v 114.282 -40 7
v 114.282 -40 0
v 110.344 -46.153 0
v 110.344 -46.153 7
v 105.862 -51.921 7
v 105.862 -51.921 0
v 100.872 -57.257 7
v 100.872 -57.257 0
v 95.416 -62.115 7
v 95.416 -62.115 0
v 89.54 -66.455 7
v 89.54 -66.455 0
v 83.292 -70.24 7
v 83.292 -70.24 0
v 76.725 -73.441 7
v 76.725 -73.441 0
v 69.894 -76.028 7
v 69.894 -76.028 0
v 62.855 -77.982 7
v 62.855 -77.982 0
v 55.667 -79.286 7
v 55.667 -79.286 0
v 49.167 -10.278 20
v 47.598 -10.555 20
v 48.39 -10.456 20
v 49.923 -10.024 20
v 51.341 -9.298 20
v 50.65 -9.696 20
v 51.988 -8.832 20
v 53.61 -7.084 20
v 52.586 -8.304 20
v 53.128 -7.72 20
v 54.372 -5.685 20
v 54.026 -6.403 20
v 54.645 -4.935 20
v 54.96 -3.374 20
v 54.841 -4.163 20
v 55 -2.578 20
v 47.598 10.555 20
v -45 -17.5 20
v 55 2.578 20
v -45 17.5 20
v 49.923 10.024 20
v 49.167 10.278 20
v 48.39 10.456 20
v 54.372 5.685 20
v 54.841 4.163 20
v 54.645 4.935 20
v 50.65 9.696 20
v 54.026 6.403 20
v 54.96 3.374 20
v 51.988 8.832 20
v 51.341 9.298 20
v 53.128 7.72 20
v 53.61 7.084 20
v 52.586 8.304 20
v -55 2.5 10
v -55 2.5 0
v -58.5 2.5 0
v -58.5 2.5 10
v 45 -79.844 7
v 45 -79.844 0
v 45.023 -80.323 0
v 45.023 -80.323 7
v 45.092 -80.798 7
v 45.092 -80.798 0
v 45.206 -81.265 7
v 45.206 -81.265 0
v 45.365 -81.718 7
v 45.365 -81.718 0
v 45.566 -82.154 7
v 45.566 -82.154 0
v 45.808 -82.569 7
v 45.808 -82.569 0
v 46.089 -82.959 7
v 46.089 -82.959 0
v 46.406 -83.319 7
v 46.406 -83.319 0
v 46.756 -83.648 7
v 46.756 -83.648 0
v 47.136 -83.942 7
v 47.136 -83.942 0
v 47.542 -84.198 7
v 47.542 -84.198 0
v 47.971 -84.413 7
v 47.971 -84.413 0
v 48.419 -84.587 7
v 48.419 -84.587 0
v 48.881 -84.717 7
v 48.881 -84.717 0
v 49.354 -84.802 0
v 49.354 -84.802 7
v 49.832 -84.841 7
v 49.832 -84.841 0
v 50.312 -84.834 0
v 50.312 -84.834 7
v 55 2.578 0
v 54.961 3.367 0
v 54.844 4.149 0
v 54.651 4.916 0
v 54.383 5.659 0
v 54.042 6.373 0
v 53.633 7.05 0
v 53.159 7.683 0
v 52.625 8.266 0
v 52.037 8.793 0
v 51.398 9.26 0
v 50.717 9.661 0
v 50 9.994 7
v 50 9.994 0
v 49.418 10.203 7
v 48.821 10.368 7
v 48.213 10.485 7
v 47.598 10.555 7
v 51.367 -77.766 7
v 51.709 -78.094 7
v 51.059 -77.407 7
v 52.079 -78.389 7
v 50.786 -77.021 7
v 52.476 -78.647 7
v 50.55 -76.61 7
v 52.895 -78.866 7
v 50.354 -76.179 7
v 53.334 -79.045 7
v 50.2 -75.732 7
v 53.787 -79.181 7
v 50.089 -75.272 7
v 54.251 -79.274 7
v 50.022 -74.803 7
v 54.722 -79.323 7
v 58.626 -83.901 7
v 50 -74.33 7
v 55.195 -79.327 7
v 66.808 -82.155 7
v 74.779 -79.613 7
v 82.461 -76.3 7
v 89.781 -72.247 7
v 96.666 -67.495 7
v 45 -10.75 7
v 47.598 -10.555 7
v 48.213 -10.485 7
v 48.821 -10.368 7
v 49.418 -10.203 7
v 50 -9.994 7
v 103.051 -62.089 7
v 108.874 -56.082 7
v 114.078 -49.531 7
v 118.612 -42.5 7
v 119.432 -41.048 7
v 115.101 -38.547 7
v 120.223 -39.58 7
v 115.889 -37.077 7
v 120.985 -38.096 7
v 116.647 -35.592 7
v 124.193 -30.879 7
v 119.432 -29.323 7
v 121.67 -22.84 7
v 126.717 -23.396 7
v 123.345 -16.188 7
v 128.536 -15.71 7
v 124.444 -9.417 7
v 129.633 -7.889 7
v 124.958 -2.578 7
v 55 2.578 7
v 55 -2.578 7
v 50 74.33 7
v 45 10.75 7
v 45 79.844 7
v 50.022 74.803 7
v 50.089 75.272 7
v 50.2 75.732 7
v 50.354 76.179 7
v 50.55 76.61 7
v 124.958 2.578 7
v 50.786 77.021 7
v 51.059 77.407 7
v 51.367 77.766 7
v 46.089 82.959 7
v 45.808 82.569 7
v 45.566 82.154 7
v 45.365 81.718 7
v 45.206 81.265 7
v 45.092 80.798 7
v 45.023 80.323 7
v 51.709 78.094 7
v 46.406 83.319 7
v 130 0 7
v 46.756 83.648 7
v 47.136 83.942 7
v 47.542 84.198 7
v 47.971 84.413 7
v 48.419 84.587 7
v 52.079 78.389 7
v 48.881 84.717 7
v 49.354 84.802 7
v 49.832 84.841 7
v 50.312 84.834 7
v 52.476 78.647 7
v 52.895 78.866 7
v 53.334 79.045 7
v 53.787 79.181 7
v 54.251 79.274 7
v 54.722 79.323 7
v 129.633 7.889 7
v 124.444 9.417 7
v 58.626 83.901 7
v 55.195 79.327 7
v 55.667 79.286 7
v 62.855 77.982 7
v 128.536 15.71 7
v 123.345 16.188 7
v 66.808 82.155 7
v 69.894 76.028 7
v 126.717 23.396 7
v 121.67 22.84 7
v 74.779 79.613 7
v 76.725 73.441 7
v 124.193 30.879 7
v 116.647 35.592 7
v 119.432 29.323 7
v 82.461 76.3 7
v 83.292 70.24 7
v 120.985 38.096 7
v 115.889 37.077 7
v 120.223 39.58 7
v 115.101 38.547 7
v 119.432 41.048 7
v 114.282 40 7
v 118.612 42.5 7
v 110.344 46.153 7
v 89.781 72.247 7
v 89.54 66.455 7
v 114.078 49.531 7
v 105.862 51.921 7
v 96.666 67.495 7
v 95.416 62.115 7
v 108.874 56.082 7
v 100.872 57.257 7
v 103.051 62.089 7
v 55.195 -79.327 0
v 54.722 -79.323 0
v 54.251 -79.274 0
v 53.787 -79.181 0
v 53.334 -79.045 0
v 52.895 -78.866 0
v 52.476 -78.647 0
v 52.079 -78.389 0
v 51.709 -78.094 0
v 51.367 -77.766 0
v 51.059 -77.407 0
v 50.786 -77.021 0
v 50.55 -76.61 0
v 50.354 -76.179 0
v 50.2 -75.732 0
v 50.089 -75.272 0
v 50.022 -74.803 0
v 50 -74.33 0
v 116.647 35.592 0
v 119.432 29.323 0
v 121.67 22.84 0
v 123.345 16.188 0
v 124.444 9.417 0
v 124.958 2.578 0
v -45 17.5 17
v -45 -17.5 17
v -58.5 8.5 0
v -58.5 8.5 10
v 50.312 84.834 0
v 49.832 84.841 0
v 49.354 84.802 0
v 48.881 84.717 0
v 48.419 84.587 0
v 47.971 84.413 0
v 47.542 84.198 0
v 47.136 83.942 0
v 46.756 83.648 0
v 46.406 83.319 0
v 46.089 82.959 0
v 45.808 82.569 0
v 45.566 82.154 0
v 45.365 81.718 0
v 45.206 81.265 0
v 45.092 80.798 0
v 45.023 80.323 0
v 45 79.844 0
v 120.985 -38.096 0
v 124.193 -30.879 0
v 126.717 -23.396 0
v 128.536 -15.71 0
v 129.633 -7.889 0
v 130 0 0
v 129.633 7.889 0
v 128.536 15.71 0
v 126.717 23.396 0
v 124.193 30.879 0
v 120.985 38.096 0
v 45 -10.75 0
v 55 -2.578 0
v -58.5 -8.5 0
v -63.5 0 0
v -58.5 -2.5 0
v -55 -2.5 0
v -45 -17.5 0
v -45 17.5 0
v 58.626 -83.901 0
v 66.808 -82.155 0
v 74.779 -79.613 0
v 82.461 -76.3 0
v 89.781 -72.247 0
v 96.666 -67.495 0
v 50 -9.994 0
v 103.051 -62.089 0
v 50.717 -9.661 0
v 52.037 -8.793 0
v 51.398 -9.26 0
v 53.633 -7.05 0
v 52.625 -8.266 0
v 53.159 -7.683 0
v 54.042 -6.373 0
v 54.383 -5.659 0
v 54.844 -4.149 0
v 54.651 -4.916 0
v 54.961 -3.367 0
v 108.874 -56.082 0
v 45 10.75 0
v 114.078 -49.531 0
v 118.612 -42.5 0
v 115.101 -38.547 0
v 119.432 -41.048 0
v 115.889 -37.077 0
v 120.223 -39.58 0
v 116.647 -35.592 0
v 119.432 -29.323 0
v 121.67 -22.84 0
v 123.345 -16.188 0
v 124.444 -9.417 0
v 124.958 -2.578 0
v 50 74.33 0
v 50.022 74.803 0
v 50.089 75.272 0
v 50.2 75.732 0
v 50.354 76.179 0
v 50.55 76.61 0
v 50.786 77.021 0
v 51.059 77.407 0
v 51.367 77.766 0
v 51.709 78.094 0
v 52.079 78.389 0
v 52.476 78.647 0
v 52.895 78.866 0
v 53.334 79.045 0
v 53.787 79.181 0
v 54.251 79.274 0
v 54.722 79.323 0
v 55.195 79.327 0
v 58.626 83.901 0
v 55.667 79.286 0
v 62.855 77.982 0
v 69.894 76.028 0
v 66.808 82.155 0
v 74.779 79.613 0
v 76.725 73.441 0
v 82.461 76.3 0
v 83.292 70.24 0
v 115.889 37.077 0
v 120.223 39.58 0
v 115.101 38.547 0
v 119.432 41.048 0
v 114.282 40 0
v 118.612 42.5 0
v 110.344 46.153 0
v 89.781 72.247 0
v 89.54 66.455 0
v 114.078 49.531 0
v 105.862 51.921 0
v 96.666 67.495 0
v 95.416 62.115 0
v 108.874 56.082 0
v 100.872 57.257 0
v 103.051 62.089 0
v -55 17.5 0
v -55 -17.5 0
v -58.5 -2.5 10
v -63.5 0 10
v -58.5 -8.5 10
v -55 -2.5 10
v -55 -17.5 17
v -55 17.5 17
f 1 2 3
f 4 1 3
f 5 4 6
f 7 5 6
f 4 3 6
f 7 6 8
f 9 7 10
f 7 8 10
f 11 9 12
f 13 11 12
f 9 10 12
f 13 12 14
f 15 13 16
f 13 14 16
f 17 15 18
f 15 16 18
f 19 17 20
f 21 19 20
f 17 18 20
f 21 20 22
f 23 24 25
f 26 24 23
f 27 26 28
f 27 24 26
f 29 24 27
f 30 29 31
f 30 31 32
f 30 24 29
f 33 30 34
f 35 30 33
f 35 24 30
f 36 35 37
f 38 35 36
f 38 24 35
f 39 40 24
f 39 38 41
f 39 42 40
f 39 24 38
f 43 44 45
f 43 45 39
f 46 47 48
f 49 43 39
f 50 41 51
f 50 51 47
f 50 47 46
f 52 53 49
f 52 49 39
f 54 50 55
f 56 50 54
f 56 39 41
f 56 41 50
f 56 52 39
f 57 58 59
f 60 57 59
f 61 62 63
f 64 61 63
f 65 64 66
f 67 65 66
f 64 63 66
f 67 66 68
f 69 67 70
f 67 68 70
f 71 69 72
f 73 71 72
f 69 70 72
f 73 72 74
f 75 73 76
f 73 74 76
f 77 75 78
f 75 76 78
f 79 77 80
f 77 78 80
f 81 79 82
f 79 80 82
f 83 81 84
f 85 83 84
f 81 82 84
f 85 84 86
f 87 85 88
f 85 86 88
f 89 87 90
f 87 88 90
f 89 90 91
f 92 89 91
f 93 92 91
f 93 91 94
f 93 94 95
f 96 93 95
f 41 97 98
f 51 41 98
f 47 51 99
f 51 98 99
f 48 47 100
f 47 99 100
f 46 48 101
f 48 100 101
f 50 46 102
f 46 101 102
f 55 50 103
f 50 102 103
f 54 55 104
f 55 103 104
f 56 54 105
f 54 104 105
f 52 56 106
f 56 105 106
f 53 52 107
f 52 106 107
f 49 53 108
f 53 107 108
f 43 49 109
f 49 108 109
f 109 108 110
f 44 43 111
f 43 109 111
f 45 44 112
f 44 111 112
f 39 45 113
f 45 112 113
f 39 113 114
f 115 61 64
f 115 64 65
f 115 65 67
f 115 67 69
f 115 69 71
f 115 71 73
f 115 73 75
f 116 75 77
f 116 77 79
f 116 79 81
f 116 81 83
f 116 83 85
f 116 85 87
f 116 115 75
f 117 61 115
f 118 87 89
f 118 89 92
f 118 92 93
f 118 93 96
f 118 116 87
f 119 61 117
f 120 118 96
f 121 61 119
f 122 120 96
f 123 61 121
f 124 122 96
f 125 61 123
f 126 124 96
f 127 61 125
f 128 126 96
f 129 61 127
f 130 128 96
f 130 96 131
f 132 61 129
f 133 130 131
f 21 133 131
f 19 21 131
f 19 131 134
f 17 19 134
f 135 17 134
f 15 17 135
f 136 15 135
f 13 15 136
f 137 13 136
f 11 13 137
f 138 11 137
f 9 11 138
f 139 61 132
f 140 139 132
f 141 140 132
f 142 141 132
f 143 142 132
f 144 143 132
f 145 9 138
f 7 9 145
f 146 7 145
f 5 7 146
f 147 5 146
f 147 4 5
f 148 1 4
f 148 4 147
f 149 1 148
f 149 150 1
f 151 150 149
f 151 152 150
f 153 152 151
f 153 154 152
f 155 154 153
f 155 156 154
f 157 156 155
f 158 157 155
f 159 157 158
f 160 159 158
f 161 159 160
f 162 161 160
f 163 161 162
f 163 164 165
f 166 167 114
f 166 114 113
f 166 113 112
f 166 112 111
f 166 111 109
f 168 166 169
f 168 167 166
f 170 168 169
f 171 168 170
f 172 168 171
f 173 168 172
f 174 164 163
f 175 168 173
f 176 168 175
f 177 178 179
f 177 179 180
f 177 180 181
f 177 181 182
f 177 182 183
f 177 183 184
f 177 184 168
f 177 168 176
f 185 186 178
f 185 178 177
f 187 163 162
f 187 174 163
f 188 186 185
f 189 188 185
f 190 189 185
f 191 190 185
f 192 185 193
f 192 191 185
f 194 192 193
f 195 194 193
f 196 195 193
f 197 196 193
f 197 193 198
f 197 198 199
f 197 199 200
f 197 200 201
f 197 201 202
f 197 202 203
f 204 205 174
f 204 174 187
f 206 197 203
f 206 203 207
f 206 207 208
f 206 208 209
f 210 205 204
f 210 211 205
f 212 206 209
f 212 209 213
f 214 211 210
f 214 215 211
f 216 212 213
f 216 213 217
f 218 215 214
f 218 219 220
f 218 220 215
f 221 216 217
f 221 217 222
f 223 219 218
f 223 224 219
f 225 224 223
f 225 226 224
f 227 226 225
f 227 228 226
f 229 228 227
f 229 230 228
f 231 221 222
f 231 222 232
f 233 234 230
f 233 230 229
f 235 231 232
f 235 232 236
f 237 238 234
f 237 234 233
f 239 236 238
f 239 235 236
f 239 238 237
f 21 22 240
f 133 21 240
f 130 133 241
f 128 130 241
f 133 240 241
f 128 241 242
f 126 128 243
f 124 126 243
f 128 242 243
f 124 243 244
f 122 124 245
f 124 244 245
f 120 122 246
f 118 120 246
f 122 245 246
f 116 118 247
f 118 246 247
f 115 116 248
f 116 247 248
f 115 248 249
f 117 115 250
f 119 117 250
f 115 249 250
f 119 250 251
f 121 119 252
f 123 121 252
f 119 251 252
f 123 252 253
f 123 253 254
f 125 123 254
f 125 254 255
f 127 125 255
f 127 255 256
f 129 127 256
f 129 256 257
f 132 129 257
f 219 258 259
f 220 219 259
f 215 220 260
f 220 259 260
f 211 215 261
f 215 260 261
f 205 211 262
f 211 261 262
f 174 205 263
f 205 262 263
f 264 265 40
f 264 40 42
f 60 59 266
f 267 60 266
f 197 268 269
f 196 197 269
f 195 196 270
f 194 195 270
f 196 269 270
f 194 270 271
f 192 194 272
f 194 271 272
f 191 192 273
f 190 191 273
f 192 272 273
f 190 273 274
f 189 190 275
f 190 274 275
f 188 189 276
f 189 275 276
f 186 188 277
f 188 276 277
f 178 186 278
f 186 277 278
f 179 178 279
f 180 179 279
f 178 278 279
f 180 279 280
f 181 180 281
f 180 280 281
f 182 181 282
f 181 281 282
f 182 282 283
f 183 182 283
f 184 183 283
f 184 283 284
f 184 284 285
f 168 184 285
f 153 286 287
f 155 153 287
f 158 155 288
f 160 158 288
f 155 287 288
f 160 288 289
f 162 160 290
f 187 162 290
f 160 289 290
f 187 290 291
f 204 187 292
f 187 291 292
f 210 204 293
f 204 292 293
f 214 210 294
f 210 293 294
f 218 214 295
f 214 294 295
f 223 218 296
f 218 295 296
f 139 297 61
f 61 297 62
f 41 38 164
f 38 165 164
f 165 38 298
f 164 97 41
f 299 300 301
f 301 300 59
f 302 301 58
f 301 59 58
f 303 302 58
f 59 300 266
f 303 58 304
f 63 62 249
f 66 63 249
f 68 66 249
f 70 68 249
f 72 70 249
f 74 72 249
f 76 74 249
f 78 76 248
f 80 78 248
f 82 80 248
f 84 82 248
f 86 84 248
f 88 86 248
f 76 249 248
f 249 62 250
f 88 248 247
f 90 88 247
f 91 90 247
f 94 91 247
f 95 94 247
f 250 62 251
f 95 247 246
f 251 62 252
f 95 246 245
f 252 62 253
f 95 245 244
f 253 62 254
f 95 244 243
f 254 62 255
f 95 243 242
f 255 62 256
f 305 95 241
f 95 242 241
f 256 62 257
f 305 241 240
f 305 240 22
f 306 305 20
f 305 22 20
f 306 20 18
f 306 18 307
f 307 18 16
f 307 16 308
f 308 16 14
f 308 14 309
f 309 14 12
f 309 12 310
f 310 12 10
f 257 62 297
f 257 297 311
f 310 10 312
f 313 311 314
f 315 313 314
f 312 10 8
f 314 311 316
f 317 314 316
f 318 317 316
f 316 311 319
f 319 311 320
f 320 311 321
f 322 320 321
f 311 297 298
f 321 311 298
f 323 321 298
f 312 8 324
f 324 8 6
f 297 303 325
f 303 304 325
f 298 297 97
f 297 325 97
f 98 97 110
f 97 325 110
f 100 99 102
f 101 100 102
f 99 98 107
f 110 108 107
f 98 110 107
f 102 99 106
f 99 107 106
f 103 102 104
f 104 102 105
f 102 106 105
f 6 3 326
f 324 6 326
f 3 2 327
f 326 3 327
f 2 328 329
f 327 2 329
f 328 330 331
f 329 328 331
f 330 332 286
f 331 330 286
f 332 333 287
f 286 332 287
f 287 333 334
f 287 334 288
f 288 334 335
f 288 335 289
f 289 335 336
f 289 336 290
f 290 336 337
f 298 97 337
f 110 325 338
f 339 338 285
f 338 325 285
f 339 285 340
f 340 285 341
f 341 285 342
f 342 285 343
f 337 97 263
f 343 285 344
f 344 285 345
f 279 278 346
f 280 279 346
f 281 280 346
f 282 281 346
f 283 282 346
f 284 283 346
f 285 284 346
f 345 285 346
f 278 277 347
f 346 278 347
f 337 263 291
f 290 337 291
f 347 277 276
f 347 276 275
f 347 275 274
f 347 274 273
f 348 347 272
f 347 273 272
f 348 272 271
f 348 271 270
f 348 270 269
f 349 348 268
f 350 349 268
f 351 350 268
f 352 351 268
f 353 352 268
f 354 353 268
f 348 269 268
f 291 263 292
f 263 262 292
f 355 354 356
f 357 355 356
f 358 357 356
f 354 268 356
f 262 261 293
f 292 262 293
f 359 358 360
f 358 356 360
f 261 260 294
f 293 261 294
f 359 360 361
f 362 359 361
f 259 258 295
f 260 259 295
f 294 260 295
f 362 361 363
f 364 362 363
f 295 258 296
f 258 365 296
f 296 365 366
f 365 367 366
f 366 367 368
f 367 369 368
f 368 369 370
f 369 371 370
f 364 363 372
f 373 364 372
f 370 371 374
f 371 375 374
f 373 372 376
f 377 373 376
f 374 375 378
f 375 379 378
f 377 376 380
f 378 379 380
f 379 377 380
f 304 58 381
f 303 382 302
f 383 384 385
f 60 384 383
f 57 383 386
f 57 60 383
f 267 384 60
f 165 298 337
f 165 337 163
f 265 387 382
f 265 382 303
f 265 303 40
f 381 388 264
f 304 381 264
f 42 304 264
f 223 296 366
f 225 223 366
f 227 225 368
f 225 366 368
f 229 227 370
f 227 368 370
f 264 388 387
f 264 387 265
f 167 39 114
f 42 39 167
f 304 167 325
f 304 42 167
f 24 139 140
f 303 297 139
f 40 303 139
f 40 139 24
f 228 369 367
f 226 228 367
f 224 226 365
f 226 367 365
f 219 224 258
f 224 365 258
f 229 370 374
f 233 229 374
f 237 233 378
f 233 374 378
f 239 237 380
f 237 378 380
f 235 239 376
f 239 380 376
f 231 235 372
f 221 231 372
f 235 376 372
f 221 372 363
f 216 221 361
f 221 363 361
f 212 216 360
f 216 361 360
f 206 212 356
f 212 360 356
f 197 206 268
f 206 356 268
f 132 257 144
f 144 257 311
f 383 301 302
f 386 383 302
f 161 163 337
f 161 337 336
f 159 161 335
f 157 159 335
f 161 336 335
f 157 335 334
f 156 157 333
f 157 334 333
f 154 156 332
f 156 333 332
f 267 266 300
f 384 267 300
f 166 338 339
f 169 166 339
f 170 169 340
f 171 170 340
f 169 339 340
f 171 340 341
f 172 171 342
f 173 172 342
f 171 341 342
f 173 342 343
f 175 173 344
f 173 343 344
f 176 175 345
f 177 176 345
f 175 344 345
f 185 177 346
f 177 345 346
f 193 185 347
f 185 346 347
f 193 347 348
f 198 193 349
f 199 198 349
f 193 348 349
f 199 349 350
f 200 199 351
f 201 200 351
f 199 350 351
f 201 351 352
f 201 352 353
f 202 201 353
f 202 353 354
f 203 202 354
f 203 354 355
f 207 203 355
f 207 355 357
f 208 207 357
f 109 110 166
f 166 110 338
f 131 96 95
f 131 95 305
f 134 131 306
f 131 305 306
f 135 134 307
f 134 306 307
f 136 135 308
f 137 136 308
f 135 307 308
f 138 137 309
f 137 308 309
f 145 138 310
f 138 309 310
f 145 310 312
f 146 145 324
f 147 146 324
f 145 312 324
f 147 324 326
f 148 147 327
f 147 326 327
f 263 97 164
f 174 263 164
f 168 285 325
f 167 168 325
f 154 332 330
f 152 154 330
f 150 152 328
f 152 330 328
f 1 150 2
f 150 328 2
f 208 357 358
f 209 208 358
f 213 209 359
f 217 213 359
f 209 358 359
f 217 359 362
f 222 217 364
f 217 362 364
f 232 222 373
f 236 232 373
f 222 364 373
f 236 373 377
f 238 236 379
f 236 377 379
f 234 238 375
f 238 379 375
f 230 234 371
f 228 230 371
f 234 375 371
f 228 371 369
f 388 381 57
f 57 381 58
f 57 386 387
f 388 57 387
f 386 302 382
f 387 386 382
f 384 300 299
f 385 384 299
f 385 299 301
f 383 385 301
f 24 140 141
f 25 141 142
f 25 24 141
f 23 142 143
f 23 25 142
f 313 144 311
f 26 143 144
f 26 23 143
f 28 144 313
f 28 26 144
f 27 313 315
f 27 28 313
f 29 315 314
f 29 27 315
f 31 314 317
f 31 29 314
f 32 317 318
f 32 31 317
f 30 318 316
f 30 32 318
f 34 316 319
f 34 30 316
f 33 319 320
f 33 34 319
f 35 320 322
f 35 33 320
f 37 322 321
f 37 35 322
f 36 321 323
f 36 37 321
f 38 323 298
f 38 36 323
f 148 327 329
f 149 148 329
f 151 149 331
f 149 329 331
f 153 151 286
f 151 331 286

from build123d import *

# Parameters (mm, degrees)
F1_DEPTH = 10
F2_DEPTH = 17
F3_W     = 100
F3_H     = 35
F4_DEPTH = 3
F5_SIZE2 = 99.99999
F5_SIZE  = 7.49999
F6_R     = 8
F8_DEPTH = 7
F9_W     = 5.1550631039
F9_H     = 7


# Not quite as in the source:
# - a fillet or chamfer is up to 0.001 mm smaller than in the source, because OpenCascade refuses the exact size


with BuildPart() as f1:
    # F0 (on Top) → F1 (new body)
    with BuildSketch(Plane.XY):
        Polygon((-58.5, -8.5), (-58.5, -2.5), (-58.5, 0), (-58.5, 2.5), (-58.5, 8.5), (-63.5, 0), align=None)
        Polygon((-58.5, -2.5), (-55, -2.5), (-55, 2.5), (-58.5, 2.5), (-58.5, 0), align=None)
    extrude(amount=F1_DEPTH)

    # F0 (on Top) → F2 (join)
    with BuildSketch(Plane.XY):
        Polygon((-55, -17.5), (55, -17.5), (55, 17.5), (-55, 17.5), (-55, 2.5), (-55, -2.5), align=None)
    extrude(amount=F2_DEPTH)

    # F3 (on face) → F4 (join)
    with BuildSketch(Plane.XY.offset(17)):
        with Locations((5, 0)):
            Rectangle(F3_W, F3_H)
    extrude(amount=F4_DEPTH)

    # F5 (size 7.5 and 100 in the source; OpenCascade refuses exactly that, so slightly less here)
    f5_edges = [f1.edges().sort_by_distance(p)[0] for p in [
        (55, -17.5, 10),
        (55, 17.5, 10),
    ]]
    f5_side = f1.faces().sort_by_distance((55, 0, 10))[0]
    chamfer(f5_edges, length=F5_SIZE, length2=F5_SIZE2, reference=f5_side)

    # F6
    f6_edges = [f1.edges().sort_by_distance(p)[0] for p in [
        (55, -10.00001, 10),
        (55, 10.00001, 10),
    ]]
    fillet(f6_edges, radius=F6_R)

    # F7 (on face) → F8 (join)
    with BuildSketch(Plane.XY):
        with BuildLine():
            ThreePointArc((118.6121593217, 42.5), (89.7807277981, 72.2473973087), (50.3125, 84.8338219329))
            ThreePointArc((50.3125, 84.8338219329), (46.5767340156, 83.4879420476), (45, 79.8435971134))
            Line((45, 79.8435971134), (45, 0))
            Line((45, 0), (50, 2.8867513459))
            Line((50, 2.8867513459), (50, 74.3303437366))
            ThreePointArc((50, 74.3303437366), (51.708597057, 78.0942070001), (55.6666666667, 79.2856999857))
            ThreePointArc((55.6666666667, 79.2856999857), (89.5397594579, 66.4545696505), (114.2820323028, 40))
            Line((114.2820323028, 40), (118.6121593217, 42.5))
        make_face()
        with BuildLine():
            ThreePointArc((120.9846922835, 38.0962798523), (119.8308271392, 40.3155963576), (118.6121593217, 42.5))
            Line((118.6121593217, 42.5), (114.2820323028, 40))
            ThreePointArc((114.2820323028, 40), (115.4987732023, 37.8143223789), (116.6465834297, 35.5916715378))
            Line((116.6465834297, 35.5916715378), (120.9846922835, 38.0962798523))
        make_face()
        with BuildLine():
            ThreePointArc((120.9846922835, -38.0962798523), (130, 0), (120.9846922835, 38.0962798523))
            Line((120.9846922835, 38.0962798523), (116.6465834297, 35.5916715378))
            ThreePointArc((116.6465834297, 35.5916715378), (125, 0), (116.6465834297, -35.5916715378))
            Line((116.6465834297, -35.5916715378), (120.9846922835, -38.0962798523))
        make_face()
        with BuildLine():
            Line((50, -2.8867513459), (45, 0))
            Line((45, 0), (45, -79.8435971134))
            ThreePointArc((45, -79.8435971134), (46.5767340156, -83.4879420476), (50.3125, -84.8338219329))
            ThreePointArc((50.3125, -84.8338219329), (89.7807277981, -72.2473973087), (118.6121593217, -42.5))
            Line((118.6121593217, -42.5), (114.2820323028, -40))
            ThreePointArc((114.2820323028, -40), (89.5397594579, -66.4545696505), (55.6666666667, -79.2856999857))
            ThreePointArc((55.6666666667, -79.2856999857), (51.708597057, -78.0942070001), (50, -74.3303437366))
            Line((50, -74.3303437366), (50, -2.8867513459))
        make_face()
        Polygon((50, 2.8867513459), (45, 0), (50, -2.8867513459), align=None)
        with BuildLine():
            ThreePointArc((118.6121593217, -42.5), (119.8308271392, -40.3155963576), (120.9846922835, -38.0962798523))
            Line((120.9846922835, -38.0962798523), (116.6465834297, -35.5916715378))
            ThreePointArc((116.6465834297, -35.5916715378), (115.4987732023, -37.8143223789), (114.2820323028, -40))
            Line((114.2820323028, -40), (118.6121593217, -42.5))
        make_face()
    extrude(amount=F8_DEPTH)

    # F9 (on face) → F10 (join, up to the next surface of F1)
    with BuildSketch(Plane.YZ.offset(55)):
        with Locations((0, 3.5)):
            Rectangle(F9_W, F9_H)
    extrude(until=Until.NEXT)


solid = f1.part
